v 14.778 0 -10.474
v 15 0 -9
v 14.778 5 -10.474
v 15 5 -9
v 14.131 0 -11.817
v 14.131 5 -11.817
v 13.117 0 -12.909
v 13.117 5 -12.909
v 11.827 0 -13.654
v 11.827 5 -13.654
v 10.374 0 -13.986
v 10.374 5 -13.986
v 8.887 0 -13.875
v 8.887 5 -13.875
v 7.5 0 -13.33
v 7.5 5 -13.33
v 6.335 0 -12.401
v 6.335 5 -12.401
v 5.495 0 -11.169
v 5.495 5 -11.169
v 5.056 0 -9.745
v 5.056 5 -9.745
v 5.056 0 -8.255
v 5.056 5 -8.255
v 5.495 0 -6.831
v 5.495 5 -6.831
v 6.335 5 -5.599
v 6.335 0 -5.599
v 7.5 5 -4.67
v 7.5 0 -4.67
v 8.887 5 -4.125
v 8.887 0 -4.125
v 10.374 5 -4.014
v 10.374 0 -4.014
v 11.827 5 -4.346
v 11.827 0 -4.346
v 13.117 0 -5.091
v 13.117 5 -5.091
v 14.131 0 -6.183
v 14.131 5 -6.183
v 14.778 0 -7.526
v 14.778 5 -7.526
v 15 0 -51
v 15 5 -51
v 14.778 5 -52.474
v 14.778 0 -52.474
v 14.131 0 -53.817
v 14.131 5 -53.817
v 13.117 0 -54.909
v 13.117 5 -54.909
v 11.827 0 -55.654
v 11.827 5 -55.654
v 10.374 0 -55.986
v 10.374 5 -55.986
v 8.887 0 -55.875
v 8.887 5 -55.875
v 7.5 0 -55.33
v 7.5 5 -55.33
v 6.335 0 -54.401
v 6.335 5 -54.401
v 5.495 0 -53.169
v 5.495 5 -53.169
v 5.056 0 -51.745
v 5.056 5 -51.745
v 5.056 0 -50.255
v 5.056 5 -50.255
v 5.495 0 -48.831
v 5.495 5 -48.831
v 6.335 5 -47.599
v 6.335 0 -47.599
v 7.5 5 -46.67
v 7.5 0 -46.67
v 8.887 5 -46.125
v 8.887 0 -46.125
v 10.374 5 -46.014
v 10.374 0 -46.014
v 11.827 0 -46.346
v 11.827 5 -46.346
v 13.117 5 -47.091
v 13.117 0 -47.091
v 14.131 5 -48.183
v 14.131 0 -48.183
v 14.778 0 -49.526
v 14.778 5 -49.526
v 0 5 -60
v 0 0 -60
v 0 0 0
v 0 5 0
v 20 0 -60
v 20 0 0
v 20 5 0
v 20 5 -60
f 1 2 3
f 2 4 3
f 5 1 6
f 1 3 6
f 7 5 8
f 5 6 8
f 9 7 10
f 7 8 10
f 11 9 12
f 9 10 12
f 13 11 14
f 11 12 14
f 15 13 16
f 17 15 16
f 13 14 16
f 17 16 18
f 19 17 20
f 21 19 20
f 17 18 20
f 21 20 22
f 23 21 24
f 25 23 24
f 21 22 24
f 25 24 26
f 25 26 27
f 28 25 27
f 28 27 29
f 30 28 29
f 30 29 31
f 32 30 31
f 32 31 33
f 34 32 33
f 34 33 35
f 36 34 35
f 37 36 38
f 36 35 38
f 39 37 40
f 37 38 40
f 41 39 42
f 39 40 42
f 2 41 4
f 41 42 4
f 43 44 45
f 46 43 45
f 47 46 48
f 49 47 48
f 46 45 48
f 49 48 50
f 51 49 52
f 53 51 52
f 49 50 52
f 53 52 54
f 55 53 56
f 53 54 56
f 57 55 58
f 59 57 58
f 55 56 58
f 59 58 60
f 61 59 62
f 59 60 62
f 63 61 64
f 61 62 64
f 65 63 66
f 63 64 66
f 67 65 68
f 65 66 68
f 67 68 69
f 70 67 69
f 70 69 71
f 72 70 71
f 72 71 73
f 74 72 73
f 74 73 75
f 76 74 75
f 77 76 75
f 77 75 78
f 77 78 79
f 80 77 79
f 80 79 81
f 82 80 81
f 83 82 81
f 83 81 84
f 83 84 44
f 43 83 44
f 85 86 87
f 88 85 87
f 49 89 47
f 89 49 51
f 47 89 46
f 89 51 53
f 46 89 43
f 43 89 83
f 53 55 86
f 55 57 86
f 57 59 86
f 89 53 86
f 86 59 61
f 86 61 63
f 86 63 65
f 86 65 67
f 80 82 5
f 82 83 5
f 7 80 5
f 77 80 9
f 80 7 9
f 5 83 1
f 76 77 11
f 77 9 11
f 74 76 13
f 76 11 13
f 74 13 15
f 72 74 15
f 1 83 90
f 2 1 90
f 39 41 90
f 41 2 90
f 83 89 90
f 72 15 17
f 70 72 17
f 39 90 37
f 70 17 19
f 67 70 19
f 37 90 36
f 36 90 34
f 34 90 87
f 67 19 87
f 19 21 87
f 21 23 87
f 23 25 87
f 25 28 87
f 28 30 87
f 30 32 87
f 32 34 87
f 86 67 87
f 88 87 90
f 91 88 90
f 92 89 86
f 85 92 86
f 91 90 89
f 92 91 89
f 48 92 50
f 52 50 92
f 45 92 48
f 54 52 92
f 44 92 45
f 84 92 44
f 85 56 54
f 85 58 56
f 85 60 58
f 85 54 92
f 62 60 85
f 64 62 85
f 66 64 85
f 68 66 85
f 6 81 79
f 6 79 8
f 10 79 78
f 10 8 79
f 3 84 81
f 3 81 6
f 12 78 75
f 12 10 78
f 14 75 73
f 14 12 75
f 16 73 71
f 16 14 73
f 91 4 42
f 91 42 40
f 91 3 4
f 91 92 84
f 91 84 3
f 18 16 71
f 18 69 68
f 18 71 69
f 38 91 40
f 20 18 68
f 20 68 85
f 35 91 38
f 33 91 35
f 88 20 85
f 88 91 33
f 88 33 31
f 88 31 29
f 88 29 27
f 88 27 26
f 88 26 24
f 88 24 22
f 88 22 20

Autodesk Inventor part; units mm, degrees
ref_plane "YZ Plane" through (0, 0, 0) normal (1, 0, 0) x (0, 1, 0)
ref_plane "XZ Plane" through (0, 0, 0) normal (0, 1, 0) x (-1, 0, 0)
ref_plane "XY Plane" through (0, 0, 0) normal (0, 0, 1) x (1, 0, 0)
sketch "Sketch1" plane through (0, 0, 0) normal (0, 1, 0) x (-1, 0, 0)
  line L0 (0, 0) -> (-20, 0)
  line L1 (-20, 0) -> (-20, -60)
  line L2 (-20, -60) -> (0, -60)
  line L3 (0, -60) -> (0, 0)
  dimension "d0" = 20
  dimension "d1" = 60
extrude "Extrusion1" add sketch "Sketch1" along normal blind 5
sketch "Sketch2" plane through (0, 5, 0) normal (0, 1, 0) x (1, 0, 0)
  line L0 (0, 0) -> (20, 0) projected
  line L1 (10, 0) -> (10, 9)
  line L2 (10, 0) -> (19, 0) construction
  circle A0 centre (10, 9) radius 5
  line L3 (20, 60) -> (0, 60) projected
  line L4 (0, 0) -> (0, 60)
  line L5 (0, 60) -> (0, 0) projected
  line L6 (0, 30) -> (2.0385, 30)
  circle A1 centre (10, 51) radius 5
  dimension "d5" = 9
  dimension "d6" = 90
  dimension "d7" = 10
extrude "Extrusion2" cut sketch "Sketch2" against normal blind 23
properties part number "BaseBancada"
